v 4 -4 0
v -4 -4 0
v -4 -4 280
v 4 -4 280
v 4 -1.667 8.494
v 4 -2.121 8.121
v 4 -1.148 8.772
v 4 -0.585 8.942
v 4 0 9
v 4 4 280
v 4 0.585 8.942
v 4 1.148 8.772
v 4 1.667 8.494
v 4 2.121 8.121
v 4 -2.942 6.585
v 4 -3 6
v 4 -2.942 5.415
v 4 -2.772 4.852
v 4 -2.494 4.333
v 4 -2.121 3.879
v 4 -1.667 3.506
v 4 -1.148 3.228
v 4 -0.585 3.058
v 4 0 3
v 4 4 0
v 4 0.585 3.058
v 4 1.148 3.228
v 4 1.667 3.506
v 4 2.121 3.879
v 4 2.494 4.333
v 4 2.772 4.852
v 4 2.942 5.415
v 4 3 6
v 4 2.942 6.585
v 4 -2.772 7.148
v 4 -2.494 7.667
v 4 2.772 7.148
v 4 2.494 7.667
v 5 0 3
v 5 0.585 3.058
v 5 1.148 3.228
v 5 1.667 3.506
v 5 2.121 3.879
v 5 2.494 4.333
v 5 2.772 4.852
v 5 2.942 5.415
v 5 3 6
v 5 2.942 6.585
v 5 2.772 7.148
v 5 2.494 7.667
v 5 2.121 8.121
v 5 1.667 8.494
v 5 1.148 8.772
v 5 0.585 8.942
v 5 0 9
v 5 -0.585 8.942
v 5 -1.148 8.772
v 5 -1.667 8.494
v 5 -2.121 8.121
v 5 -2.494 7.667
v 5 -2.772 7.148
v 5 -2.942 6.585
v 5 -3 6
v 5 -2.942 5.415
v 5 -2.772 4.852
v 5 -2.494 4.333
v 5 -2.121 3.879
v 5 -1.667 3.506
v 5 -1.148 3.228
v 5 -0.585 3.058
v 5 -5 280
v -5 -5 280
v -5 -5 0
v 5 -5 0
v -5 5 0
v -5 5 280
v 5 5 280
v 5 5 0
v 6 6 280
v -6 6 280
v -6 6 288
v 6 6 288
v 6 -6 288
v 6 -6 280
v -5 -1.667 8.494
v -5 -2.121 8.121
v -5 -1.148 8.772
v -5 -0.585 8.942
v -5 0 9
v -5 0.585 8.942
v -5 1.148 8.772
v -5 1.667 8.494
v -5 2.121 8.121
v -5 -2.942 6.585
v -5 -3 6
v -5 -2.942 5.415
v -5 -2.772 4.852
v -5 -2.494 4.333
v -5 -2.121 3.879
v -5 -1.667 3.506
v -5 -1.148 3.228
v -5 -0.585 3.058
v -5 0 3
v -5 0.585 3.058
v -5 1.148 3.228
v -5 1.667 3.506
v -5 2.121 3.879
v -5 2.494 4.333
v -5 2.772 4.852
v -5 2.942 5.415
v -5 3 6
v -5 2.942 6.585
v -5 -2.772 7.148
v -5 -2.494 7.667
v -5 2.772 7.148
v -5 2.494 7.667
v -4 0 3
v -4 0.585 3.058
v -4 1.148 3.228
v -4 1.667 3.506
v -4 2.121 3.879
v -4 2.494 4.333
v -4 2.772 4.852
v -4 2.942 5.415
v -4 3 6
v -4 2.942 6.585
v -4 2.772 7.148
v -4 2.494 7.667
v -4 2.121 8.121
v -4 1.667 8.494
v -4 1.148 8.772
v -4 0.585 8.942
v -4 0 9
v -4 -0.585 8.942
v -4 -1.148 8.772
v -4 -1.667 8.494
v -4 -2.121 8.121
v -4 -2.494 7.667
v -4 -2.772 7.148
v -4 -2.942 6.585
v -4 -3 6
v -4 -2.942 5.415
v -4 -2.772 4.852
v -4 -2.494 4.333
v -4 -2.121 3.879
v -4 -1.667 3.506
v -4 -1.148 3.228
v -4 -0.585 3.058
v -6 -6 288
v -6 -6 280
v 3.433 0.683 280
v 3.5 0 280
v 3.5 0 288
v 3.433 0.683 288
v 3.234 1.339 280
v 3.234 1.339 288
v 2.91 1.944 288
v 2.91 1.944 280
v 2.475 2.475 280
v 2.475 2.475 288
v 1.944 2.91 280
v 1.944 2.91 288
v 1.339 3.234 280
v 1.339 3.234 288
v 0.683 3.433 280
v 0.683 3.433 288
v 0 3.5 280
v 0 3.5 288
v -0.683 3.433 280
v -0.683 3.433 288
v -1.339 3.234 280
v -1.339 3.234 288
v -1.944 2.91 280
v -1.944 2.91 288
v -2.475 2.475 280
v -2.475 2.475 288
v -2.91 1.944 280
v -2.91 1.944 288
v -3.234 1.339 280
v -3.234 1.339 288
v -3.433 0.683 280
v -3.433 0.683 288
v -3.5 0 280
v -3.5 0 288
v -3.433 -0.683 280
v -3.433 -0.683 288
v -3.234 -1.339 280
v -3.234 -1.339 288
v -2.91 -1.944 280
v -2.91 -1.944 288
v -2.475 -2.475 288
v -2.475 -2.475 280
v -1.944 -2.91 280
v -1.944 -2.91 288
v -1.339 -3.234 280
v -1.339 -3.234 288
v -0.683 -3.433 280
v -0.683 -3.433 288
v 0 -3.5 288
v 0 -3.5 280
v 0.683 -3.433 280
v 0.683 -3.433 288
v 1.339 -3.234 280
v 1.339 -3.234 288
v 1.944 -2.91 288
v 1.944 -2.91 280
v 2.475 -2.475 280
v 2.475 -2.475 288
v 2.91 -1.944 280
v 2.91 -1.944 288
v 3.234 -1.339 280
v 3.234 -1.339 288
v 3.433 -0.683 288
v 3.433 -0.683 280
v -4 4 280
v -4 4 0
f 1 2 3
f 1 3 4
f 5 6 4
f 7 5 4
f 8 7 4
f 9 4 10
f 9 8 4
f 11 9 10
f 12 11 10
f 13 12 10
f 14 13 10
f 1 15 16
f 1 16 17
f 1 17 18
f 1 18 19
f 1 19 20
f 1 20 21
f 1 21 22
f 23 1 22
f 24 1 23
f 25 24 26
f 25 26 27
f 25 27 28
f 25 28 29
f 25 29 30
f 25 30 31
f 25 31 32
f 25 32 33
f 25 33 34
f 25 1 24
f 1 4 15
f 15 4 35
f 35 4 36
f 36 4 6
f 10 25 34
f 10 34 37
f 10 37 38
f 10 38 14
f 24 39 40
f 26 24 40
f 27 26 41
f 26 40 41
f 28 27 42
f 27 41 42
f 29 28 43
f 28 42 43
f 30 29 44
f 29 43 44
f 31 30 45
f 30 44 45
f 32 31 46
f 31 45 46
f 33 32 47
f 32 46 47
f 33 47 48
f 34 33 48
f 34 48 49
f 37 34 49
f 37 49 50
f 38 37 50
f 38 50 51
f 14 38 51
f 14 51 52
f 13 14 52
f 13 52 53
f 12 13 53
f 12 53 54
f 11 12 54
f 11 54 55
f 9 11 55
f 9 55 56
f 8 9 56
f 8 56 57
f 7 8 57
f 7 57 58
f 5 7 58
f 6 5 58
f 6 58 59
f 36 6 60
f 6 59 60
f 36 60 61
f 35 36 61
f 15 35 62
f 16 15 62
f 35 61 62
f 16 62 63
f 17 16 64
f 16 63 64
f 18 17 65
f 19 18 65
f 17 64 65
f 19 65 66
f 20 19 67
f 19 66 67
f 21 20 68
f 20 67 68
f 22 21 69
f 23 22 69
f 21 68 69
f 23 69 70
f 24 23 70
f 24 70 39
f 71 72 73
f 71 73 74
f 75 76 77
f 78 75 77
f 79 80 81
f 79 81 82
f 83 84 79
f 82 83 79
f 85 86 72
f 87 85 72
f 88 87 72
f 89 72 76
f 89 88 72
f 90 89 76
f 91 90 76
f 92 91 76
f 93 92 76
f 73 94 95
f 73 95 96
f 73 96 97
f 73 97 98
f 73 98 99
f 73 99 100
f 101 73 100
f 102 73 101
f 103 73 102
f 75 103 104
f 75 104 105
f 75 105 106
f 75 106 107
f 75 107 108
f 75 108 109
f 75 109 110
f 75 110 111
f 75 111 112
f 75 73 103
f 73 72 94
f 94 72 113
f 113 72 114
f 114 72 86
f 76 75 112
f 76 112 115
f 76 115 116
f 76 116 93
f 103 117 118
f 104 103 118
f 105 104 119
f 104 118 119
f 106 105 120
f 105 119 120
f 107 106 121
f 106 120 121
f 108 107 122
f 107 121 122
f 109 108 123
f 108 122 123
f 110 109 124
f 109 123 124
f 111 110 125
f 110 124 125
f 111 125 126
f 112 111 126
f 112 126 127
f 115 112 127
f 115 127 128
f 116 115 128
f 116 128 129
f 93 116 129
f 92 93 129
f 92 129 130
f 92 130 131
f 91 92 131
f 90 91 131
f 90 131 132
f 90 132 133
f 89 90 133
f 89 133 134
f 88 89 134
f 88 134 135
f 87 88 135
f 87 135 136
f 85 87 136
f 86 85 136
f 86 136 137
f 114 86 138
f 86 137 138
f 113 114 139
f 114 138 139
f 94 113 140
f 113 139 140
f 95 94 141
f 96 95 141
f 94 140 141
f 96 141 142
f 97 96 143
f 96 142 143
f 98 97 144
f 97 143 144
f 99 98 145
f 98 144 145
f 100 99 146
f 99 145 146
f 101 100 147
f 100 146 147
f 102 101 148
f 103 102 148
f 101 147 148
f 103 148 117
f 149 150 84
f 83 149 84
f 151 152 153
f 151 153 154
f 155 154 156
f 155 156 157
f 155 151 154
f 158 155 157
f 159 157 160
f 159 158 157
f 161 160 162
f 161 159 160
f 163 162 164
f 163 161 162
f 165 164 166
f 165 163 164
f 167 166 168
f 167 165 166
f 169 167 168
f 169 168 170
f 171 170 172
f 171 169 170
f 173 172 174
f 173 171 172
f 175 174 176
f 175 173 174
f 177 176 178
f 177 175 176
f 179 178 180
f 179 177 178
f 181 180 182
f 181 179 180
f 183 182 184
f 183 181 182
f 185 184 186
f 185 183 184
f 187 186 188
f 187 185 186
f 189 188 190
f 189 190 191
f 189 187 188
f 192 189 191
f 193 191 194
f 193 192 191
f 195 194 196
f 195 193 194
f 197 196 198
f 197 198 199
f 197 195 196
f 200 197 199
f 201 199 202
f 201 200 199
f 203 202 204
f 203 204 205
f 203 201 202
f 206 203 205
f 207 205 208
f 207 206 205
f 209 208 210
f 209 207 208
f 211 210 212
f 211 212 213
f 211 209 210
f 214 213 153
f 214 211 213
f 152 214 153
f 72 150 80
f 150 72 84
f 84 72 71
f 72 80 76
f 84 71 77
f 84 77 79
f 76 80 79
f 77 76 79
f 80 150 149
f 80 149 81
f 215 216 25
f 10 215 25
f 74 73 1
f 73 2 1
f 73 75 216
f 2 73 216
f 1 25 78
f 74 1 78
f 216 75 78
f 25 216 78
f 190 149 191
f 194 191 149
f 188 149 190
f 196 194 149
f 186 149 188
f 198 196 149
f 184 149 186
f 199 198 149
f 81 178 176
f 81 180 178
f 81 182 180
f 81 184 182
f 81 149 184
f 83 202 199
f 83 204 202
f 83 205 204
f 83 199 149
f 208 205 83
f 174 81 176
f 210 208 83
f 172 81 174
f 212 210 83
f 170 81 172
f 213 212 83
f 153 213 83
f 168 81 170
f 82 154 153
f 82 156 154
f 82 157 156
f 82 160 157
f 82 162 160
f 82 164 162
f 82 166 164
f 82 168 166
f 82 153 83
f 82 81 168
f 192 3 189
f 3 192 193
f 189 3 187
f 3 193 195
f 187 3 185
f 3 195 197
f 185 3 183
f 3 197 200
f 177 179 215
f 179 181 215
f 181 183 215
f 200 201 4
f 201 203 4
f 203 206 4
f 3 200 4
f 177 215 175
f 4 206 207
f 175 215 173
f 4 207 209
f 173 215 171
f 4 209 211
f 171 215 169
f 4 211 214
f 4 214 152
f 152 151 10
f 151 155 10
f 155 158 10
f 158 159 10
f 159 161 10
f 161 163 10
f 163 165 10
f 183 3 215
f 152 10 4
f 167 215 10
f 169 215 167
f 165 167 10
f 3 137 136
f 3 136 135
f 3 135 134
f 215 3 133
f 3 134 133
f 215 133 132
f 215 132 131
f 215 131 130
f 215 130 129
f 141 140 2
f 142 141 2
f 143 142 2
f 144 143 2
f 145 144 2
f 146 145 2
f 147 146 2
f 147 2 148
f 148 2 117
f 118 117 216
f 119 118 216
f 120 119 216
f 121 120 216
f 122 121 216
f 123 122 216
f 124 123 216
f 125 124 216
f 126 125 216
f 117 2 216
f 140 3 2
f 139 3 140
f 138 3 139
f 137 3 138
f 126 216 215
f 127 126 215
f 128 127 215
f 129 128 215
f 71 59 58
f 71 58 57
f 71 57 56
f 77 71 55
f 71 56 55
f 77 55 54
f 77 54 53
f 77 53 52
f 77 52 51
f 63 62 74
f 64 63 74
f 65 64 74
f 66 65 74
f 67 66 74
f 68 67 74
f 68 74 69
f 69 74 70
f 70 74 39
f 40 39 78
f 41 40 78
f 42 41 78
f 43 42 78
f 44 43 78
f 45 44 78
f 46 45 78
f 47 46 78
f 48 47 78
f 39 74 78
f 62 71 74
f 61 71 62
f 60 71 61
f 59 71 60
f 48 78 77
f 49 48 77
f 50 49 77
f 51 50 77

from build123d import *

# Parameters (mm, degrees)
ESQUISSE2_W             = 10
ESQUISSE2_H             = 10
ESQUISSE2_W_2           = 8
ESQUISSE2_H_2           = 8
BOSS_EXTRU_1_DEPTH      = 280
ESQUISSE3_R             = 3
ENL_V_MAT_EXTRU_1_DEPTH = 52
ESQUISSE4_W             = 12
ESQUISSE4_H             = 12
ESQUISSE4_R             = 3.5
BOSS_EXTRU_2_DEPTH      = 8


with BuildPart() as part:
    # Esquisse2 → Boss.-Extru.1 (new body)
    with BuildSketch(Plane.XY):
        Rectangle(ESQUISSE2_W, ESQUISSE2_H)
        Rectangle(ESQUISSE2_W_2, ESQUISSE2_H_2, mode=Mode.SUBTRACT)
    extrude(amount=BOSS_EXTRU_1_DEPTH)

    # Esquisse3 → Enlèv. mat.-Extru.1 (cut)
    with BuildSketch(Plane(origin=(5, 0, 0), x_dir=(0, 0, -1), z_dir=(1, 0, 0))):
        with Locations((-6, 0)):
            Circle(ESQUISSE3_R)
    extrude(amount=-ENL_V_MAT_EXTRU_1_DEPTH, mode=Mode.SUBTRACT)

    # Esquisse4 → Boss.-Extru.2 (add)
    with BuildSketch(Plane.XY.offset(280)):
        Rectangle(ESQUISSE4_W, ESQUISSE4_H)
        Circle(ESQUISSE4_R, mode=Mode.SUBTRACT)
    extrude(amount=BOSS_EXTRU_2_DEPTH)


solid = part.part
